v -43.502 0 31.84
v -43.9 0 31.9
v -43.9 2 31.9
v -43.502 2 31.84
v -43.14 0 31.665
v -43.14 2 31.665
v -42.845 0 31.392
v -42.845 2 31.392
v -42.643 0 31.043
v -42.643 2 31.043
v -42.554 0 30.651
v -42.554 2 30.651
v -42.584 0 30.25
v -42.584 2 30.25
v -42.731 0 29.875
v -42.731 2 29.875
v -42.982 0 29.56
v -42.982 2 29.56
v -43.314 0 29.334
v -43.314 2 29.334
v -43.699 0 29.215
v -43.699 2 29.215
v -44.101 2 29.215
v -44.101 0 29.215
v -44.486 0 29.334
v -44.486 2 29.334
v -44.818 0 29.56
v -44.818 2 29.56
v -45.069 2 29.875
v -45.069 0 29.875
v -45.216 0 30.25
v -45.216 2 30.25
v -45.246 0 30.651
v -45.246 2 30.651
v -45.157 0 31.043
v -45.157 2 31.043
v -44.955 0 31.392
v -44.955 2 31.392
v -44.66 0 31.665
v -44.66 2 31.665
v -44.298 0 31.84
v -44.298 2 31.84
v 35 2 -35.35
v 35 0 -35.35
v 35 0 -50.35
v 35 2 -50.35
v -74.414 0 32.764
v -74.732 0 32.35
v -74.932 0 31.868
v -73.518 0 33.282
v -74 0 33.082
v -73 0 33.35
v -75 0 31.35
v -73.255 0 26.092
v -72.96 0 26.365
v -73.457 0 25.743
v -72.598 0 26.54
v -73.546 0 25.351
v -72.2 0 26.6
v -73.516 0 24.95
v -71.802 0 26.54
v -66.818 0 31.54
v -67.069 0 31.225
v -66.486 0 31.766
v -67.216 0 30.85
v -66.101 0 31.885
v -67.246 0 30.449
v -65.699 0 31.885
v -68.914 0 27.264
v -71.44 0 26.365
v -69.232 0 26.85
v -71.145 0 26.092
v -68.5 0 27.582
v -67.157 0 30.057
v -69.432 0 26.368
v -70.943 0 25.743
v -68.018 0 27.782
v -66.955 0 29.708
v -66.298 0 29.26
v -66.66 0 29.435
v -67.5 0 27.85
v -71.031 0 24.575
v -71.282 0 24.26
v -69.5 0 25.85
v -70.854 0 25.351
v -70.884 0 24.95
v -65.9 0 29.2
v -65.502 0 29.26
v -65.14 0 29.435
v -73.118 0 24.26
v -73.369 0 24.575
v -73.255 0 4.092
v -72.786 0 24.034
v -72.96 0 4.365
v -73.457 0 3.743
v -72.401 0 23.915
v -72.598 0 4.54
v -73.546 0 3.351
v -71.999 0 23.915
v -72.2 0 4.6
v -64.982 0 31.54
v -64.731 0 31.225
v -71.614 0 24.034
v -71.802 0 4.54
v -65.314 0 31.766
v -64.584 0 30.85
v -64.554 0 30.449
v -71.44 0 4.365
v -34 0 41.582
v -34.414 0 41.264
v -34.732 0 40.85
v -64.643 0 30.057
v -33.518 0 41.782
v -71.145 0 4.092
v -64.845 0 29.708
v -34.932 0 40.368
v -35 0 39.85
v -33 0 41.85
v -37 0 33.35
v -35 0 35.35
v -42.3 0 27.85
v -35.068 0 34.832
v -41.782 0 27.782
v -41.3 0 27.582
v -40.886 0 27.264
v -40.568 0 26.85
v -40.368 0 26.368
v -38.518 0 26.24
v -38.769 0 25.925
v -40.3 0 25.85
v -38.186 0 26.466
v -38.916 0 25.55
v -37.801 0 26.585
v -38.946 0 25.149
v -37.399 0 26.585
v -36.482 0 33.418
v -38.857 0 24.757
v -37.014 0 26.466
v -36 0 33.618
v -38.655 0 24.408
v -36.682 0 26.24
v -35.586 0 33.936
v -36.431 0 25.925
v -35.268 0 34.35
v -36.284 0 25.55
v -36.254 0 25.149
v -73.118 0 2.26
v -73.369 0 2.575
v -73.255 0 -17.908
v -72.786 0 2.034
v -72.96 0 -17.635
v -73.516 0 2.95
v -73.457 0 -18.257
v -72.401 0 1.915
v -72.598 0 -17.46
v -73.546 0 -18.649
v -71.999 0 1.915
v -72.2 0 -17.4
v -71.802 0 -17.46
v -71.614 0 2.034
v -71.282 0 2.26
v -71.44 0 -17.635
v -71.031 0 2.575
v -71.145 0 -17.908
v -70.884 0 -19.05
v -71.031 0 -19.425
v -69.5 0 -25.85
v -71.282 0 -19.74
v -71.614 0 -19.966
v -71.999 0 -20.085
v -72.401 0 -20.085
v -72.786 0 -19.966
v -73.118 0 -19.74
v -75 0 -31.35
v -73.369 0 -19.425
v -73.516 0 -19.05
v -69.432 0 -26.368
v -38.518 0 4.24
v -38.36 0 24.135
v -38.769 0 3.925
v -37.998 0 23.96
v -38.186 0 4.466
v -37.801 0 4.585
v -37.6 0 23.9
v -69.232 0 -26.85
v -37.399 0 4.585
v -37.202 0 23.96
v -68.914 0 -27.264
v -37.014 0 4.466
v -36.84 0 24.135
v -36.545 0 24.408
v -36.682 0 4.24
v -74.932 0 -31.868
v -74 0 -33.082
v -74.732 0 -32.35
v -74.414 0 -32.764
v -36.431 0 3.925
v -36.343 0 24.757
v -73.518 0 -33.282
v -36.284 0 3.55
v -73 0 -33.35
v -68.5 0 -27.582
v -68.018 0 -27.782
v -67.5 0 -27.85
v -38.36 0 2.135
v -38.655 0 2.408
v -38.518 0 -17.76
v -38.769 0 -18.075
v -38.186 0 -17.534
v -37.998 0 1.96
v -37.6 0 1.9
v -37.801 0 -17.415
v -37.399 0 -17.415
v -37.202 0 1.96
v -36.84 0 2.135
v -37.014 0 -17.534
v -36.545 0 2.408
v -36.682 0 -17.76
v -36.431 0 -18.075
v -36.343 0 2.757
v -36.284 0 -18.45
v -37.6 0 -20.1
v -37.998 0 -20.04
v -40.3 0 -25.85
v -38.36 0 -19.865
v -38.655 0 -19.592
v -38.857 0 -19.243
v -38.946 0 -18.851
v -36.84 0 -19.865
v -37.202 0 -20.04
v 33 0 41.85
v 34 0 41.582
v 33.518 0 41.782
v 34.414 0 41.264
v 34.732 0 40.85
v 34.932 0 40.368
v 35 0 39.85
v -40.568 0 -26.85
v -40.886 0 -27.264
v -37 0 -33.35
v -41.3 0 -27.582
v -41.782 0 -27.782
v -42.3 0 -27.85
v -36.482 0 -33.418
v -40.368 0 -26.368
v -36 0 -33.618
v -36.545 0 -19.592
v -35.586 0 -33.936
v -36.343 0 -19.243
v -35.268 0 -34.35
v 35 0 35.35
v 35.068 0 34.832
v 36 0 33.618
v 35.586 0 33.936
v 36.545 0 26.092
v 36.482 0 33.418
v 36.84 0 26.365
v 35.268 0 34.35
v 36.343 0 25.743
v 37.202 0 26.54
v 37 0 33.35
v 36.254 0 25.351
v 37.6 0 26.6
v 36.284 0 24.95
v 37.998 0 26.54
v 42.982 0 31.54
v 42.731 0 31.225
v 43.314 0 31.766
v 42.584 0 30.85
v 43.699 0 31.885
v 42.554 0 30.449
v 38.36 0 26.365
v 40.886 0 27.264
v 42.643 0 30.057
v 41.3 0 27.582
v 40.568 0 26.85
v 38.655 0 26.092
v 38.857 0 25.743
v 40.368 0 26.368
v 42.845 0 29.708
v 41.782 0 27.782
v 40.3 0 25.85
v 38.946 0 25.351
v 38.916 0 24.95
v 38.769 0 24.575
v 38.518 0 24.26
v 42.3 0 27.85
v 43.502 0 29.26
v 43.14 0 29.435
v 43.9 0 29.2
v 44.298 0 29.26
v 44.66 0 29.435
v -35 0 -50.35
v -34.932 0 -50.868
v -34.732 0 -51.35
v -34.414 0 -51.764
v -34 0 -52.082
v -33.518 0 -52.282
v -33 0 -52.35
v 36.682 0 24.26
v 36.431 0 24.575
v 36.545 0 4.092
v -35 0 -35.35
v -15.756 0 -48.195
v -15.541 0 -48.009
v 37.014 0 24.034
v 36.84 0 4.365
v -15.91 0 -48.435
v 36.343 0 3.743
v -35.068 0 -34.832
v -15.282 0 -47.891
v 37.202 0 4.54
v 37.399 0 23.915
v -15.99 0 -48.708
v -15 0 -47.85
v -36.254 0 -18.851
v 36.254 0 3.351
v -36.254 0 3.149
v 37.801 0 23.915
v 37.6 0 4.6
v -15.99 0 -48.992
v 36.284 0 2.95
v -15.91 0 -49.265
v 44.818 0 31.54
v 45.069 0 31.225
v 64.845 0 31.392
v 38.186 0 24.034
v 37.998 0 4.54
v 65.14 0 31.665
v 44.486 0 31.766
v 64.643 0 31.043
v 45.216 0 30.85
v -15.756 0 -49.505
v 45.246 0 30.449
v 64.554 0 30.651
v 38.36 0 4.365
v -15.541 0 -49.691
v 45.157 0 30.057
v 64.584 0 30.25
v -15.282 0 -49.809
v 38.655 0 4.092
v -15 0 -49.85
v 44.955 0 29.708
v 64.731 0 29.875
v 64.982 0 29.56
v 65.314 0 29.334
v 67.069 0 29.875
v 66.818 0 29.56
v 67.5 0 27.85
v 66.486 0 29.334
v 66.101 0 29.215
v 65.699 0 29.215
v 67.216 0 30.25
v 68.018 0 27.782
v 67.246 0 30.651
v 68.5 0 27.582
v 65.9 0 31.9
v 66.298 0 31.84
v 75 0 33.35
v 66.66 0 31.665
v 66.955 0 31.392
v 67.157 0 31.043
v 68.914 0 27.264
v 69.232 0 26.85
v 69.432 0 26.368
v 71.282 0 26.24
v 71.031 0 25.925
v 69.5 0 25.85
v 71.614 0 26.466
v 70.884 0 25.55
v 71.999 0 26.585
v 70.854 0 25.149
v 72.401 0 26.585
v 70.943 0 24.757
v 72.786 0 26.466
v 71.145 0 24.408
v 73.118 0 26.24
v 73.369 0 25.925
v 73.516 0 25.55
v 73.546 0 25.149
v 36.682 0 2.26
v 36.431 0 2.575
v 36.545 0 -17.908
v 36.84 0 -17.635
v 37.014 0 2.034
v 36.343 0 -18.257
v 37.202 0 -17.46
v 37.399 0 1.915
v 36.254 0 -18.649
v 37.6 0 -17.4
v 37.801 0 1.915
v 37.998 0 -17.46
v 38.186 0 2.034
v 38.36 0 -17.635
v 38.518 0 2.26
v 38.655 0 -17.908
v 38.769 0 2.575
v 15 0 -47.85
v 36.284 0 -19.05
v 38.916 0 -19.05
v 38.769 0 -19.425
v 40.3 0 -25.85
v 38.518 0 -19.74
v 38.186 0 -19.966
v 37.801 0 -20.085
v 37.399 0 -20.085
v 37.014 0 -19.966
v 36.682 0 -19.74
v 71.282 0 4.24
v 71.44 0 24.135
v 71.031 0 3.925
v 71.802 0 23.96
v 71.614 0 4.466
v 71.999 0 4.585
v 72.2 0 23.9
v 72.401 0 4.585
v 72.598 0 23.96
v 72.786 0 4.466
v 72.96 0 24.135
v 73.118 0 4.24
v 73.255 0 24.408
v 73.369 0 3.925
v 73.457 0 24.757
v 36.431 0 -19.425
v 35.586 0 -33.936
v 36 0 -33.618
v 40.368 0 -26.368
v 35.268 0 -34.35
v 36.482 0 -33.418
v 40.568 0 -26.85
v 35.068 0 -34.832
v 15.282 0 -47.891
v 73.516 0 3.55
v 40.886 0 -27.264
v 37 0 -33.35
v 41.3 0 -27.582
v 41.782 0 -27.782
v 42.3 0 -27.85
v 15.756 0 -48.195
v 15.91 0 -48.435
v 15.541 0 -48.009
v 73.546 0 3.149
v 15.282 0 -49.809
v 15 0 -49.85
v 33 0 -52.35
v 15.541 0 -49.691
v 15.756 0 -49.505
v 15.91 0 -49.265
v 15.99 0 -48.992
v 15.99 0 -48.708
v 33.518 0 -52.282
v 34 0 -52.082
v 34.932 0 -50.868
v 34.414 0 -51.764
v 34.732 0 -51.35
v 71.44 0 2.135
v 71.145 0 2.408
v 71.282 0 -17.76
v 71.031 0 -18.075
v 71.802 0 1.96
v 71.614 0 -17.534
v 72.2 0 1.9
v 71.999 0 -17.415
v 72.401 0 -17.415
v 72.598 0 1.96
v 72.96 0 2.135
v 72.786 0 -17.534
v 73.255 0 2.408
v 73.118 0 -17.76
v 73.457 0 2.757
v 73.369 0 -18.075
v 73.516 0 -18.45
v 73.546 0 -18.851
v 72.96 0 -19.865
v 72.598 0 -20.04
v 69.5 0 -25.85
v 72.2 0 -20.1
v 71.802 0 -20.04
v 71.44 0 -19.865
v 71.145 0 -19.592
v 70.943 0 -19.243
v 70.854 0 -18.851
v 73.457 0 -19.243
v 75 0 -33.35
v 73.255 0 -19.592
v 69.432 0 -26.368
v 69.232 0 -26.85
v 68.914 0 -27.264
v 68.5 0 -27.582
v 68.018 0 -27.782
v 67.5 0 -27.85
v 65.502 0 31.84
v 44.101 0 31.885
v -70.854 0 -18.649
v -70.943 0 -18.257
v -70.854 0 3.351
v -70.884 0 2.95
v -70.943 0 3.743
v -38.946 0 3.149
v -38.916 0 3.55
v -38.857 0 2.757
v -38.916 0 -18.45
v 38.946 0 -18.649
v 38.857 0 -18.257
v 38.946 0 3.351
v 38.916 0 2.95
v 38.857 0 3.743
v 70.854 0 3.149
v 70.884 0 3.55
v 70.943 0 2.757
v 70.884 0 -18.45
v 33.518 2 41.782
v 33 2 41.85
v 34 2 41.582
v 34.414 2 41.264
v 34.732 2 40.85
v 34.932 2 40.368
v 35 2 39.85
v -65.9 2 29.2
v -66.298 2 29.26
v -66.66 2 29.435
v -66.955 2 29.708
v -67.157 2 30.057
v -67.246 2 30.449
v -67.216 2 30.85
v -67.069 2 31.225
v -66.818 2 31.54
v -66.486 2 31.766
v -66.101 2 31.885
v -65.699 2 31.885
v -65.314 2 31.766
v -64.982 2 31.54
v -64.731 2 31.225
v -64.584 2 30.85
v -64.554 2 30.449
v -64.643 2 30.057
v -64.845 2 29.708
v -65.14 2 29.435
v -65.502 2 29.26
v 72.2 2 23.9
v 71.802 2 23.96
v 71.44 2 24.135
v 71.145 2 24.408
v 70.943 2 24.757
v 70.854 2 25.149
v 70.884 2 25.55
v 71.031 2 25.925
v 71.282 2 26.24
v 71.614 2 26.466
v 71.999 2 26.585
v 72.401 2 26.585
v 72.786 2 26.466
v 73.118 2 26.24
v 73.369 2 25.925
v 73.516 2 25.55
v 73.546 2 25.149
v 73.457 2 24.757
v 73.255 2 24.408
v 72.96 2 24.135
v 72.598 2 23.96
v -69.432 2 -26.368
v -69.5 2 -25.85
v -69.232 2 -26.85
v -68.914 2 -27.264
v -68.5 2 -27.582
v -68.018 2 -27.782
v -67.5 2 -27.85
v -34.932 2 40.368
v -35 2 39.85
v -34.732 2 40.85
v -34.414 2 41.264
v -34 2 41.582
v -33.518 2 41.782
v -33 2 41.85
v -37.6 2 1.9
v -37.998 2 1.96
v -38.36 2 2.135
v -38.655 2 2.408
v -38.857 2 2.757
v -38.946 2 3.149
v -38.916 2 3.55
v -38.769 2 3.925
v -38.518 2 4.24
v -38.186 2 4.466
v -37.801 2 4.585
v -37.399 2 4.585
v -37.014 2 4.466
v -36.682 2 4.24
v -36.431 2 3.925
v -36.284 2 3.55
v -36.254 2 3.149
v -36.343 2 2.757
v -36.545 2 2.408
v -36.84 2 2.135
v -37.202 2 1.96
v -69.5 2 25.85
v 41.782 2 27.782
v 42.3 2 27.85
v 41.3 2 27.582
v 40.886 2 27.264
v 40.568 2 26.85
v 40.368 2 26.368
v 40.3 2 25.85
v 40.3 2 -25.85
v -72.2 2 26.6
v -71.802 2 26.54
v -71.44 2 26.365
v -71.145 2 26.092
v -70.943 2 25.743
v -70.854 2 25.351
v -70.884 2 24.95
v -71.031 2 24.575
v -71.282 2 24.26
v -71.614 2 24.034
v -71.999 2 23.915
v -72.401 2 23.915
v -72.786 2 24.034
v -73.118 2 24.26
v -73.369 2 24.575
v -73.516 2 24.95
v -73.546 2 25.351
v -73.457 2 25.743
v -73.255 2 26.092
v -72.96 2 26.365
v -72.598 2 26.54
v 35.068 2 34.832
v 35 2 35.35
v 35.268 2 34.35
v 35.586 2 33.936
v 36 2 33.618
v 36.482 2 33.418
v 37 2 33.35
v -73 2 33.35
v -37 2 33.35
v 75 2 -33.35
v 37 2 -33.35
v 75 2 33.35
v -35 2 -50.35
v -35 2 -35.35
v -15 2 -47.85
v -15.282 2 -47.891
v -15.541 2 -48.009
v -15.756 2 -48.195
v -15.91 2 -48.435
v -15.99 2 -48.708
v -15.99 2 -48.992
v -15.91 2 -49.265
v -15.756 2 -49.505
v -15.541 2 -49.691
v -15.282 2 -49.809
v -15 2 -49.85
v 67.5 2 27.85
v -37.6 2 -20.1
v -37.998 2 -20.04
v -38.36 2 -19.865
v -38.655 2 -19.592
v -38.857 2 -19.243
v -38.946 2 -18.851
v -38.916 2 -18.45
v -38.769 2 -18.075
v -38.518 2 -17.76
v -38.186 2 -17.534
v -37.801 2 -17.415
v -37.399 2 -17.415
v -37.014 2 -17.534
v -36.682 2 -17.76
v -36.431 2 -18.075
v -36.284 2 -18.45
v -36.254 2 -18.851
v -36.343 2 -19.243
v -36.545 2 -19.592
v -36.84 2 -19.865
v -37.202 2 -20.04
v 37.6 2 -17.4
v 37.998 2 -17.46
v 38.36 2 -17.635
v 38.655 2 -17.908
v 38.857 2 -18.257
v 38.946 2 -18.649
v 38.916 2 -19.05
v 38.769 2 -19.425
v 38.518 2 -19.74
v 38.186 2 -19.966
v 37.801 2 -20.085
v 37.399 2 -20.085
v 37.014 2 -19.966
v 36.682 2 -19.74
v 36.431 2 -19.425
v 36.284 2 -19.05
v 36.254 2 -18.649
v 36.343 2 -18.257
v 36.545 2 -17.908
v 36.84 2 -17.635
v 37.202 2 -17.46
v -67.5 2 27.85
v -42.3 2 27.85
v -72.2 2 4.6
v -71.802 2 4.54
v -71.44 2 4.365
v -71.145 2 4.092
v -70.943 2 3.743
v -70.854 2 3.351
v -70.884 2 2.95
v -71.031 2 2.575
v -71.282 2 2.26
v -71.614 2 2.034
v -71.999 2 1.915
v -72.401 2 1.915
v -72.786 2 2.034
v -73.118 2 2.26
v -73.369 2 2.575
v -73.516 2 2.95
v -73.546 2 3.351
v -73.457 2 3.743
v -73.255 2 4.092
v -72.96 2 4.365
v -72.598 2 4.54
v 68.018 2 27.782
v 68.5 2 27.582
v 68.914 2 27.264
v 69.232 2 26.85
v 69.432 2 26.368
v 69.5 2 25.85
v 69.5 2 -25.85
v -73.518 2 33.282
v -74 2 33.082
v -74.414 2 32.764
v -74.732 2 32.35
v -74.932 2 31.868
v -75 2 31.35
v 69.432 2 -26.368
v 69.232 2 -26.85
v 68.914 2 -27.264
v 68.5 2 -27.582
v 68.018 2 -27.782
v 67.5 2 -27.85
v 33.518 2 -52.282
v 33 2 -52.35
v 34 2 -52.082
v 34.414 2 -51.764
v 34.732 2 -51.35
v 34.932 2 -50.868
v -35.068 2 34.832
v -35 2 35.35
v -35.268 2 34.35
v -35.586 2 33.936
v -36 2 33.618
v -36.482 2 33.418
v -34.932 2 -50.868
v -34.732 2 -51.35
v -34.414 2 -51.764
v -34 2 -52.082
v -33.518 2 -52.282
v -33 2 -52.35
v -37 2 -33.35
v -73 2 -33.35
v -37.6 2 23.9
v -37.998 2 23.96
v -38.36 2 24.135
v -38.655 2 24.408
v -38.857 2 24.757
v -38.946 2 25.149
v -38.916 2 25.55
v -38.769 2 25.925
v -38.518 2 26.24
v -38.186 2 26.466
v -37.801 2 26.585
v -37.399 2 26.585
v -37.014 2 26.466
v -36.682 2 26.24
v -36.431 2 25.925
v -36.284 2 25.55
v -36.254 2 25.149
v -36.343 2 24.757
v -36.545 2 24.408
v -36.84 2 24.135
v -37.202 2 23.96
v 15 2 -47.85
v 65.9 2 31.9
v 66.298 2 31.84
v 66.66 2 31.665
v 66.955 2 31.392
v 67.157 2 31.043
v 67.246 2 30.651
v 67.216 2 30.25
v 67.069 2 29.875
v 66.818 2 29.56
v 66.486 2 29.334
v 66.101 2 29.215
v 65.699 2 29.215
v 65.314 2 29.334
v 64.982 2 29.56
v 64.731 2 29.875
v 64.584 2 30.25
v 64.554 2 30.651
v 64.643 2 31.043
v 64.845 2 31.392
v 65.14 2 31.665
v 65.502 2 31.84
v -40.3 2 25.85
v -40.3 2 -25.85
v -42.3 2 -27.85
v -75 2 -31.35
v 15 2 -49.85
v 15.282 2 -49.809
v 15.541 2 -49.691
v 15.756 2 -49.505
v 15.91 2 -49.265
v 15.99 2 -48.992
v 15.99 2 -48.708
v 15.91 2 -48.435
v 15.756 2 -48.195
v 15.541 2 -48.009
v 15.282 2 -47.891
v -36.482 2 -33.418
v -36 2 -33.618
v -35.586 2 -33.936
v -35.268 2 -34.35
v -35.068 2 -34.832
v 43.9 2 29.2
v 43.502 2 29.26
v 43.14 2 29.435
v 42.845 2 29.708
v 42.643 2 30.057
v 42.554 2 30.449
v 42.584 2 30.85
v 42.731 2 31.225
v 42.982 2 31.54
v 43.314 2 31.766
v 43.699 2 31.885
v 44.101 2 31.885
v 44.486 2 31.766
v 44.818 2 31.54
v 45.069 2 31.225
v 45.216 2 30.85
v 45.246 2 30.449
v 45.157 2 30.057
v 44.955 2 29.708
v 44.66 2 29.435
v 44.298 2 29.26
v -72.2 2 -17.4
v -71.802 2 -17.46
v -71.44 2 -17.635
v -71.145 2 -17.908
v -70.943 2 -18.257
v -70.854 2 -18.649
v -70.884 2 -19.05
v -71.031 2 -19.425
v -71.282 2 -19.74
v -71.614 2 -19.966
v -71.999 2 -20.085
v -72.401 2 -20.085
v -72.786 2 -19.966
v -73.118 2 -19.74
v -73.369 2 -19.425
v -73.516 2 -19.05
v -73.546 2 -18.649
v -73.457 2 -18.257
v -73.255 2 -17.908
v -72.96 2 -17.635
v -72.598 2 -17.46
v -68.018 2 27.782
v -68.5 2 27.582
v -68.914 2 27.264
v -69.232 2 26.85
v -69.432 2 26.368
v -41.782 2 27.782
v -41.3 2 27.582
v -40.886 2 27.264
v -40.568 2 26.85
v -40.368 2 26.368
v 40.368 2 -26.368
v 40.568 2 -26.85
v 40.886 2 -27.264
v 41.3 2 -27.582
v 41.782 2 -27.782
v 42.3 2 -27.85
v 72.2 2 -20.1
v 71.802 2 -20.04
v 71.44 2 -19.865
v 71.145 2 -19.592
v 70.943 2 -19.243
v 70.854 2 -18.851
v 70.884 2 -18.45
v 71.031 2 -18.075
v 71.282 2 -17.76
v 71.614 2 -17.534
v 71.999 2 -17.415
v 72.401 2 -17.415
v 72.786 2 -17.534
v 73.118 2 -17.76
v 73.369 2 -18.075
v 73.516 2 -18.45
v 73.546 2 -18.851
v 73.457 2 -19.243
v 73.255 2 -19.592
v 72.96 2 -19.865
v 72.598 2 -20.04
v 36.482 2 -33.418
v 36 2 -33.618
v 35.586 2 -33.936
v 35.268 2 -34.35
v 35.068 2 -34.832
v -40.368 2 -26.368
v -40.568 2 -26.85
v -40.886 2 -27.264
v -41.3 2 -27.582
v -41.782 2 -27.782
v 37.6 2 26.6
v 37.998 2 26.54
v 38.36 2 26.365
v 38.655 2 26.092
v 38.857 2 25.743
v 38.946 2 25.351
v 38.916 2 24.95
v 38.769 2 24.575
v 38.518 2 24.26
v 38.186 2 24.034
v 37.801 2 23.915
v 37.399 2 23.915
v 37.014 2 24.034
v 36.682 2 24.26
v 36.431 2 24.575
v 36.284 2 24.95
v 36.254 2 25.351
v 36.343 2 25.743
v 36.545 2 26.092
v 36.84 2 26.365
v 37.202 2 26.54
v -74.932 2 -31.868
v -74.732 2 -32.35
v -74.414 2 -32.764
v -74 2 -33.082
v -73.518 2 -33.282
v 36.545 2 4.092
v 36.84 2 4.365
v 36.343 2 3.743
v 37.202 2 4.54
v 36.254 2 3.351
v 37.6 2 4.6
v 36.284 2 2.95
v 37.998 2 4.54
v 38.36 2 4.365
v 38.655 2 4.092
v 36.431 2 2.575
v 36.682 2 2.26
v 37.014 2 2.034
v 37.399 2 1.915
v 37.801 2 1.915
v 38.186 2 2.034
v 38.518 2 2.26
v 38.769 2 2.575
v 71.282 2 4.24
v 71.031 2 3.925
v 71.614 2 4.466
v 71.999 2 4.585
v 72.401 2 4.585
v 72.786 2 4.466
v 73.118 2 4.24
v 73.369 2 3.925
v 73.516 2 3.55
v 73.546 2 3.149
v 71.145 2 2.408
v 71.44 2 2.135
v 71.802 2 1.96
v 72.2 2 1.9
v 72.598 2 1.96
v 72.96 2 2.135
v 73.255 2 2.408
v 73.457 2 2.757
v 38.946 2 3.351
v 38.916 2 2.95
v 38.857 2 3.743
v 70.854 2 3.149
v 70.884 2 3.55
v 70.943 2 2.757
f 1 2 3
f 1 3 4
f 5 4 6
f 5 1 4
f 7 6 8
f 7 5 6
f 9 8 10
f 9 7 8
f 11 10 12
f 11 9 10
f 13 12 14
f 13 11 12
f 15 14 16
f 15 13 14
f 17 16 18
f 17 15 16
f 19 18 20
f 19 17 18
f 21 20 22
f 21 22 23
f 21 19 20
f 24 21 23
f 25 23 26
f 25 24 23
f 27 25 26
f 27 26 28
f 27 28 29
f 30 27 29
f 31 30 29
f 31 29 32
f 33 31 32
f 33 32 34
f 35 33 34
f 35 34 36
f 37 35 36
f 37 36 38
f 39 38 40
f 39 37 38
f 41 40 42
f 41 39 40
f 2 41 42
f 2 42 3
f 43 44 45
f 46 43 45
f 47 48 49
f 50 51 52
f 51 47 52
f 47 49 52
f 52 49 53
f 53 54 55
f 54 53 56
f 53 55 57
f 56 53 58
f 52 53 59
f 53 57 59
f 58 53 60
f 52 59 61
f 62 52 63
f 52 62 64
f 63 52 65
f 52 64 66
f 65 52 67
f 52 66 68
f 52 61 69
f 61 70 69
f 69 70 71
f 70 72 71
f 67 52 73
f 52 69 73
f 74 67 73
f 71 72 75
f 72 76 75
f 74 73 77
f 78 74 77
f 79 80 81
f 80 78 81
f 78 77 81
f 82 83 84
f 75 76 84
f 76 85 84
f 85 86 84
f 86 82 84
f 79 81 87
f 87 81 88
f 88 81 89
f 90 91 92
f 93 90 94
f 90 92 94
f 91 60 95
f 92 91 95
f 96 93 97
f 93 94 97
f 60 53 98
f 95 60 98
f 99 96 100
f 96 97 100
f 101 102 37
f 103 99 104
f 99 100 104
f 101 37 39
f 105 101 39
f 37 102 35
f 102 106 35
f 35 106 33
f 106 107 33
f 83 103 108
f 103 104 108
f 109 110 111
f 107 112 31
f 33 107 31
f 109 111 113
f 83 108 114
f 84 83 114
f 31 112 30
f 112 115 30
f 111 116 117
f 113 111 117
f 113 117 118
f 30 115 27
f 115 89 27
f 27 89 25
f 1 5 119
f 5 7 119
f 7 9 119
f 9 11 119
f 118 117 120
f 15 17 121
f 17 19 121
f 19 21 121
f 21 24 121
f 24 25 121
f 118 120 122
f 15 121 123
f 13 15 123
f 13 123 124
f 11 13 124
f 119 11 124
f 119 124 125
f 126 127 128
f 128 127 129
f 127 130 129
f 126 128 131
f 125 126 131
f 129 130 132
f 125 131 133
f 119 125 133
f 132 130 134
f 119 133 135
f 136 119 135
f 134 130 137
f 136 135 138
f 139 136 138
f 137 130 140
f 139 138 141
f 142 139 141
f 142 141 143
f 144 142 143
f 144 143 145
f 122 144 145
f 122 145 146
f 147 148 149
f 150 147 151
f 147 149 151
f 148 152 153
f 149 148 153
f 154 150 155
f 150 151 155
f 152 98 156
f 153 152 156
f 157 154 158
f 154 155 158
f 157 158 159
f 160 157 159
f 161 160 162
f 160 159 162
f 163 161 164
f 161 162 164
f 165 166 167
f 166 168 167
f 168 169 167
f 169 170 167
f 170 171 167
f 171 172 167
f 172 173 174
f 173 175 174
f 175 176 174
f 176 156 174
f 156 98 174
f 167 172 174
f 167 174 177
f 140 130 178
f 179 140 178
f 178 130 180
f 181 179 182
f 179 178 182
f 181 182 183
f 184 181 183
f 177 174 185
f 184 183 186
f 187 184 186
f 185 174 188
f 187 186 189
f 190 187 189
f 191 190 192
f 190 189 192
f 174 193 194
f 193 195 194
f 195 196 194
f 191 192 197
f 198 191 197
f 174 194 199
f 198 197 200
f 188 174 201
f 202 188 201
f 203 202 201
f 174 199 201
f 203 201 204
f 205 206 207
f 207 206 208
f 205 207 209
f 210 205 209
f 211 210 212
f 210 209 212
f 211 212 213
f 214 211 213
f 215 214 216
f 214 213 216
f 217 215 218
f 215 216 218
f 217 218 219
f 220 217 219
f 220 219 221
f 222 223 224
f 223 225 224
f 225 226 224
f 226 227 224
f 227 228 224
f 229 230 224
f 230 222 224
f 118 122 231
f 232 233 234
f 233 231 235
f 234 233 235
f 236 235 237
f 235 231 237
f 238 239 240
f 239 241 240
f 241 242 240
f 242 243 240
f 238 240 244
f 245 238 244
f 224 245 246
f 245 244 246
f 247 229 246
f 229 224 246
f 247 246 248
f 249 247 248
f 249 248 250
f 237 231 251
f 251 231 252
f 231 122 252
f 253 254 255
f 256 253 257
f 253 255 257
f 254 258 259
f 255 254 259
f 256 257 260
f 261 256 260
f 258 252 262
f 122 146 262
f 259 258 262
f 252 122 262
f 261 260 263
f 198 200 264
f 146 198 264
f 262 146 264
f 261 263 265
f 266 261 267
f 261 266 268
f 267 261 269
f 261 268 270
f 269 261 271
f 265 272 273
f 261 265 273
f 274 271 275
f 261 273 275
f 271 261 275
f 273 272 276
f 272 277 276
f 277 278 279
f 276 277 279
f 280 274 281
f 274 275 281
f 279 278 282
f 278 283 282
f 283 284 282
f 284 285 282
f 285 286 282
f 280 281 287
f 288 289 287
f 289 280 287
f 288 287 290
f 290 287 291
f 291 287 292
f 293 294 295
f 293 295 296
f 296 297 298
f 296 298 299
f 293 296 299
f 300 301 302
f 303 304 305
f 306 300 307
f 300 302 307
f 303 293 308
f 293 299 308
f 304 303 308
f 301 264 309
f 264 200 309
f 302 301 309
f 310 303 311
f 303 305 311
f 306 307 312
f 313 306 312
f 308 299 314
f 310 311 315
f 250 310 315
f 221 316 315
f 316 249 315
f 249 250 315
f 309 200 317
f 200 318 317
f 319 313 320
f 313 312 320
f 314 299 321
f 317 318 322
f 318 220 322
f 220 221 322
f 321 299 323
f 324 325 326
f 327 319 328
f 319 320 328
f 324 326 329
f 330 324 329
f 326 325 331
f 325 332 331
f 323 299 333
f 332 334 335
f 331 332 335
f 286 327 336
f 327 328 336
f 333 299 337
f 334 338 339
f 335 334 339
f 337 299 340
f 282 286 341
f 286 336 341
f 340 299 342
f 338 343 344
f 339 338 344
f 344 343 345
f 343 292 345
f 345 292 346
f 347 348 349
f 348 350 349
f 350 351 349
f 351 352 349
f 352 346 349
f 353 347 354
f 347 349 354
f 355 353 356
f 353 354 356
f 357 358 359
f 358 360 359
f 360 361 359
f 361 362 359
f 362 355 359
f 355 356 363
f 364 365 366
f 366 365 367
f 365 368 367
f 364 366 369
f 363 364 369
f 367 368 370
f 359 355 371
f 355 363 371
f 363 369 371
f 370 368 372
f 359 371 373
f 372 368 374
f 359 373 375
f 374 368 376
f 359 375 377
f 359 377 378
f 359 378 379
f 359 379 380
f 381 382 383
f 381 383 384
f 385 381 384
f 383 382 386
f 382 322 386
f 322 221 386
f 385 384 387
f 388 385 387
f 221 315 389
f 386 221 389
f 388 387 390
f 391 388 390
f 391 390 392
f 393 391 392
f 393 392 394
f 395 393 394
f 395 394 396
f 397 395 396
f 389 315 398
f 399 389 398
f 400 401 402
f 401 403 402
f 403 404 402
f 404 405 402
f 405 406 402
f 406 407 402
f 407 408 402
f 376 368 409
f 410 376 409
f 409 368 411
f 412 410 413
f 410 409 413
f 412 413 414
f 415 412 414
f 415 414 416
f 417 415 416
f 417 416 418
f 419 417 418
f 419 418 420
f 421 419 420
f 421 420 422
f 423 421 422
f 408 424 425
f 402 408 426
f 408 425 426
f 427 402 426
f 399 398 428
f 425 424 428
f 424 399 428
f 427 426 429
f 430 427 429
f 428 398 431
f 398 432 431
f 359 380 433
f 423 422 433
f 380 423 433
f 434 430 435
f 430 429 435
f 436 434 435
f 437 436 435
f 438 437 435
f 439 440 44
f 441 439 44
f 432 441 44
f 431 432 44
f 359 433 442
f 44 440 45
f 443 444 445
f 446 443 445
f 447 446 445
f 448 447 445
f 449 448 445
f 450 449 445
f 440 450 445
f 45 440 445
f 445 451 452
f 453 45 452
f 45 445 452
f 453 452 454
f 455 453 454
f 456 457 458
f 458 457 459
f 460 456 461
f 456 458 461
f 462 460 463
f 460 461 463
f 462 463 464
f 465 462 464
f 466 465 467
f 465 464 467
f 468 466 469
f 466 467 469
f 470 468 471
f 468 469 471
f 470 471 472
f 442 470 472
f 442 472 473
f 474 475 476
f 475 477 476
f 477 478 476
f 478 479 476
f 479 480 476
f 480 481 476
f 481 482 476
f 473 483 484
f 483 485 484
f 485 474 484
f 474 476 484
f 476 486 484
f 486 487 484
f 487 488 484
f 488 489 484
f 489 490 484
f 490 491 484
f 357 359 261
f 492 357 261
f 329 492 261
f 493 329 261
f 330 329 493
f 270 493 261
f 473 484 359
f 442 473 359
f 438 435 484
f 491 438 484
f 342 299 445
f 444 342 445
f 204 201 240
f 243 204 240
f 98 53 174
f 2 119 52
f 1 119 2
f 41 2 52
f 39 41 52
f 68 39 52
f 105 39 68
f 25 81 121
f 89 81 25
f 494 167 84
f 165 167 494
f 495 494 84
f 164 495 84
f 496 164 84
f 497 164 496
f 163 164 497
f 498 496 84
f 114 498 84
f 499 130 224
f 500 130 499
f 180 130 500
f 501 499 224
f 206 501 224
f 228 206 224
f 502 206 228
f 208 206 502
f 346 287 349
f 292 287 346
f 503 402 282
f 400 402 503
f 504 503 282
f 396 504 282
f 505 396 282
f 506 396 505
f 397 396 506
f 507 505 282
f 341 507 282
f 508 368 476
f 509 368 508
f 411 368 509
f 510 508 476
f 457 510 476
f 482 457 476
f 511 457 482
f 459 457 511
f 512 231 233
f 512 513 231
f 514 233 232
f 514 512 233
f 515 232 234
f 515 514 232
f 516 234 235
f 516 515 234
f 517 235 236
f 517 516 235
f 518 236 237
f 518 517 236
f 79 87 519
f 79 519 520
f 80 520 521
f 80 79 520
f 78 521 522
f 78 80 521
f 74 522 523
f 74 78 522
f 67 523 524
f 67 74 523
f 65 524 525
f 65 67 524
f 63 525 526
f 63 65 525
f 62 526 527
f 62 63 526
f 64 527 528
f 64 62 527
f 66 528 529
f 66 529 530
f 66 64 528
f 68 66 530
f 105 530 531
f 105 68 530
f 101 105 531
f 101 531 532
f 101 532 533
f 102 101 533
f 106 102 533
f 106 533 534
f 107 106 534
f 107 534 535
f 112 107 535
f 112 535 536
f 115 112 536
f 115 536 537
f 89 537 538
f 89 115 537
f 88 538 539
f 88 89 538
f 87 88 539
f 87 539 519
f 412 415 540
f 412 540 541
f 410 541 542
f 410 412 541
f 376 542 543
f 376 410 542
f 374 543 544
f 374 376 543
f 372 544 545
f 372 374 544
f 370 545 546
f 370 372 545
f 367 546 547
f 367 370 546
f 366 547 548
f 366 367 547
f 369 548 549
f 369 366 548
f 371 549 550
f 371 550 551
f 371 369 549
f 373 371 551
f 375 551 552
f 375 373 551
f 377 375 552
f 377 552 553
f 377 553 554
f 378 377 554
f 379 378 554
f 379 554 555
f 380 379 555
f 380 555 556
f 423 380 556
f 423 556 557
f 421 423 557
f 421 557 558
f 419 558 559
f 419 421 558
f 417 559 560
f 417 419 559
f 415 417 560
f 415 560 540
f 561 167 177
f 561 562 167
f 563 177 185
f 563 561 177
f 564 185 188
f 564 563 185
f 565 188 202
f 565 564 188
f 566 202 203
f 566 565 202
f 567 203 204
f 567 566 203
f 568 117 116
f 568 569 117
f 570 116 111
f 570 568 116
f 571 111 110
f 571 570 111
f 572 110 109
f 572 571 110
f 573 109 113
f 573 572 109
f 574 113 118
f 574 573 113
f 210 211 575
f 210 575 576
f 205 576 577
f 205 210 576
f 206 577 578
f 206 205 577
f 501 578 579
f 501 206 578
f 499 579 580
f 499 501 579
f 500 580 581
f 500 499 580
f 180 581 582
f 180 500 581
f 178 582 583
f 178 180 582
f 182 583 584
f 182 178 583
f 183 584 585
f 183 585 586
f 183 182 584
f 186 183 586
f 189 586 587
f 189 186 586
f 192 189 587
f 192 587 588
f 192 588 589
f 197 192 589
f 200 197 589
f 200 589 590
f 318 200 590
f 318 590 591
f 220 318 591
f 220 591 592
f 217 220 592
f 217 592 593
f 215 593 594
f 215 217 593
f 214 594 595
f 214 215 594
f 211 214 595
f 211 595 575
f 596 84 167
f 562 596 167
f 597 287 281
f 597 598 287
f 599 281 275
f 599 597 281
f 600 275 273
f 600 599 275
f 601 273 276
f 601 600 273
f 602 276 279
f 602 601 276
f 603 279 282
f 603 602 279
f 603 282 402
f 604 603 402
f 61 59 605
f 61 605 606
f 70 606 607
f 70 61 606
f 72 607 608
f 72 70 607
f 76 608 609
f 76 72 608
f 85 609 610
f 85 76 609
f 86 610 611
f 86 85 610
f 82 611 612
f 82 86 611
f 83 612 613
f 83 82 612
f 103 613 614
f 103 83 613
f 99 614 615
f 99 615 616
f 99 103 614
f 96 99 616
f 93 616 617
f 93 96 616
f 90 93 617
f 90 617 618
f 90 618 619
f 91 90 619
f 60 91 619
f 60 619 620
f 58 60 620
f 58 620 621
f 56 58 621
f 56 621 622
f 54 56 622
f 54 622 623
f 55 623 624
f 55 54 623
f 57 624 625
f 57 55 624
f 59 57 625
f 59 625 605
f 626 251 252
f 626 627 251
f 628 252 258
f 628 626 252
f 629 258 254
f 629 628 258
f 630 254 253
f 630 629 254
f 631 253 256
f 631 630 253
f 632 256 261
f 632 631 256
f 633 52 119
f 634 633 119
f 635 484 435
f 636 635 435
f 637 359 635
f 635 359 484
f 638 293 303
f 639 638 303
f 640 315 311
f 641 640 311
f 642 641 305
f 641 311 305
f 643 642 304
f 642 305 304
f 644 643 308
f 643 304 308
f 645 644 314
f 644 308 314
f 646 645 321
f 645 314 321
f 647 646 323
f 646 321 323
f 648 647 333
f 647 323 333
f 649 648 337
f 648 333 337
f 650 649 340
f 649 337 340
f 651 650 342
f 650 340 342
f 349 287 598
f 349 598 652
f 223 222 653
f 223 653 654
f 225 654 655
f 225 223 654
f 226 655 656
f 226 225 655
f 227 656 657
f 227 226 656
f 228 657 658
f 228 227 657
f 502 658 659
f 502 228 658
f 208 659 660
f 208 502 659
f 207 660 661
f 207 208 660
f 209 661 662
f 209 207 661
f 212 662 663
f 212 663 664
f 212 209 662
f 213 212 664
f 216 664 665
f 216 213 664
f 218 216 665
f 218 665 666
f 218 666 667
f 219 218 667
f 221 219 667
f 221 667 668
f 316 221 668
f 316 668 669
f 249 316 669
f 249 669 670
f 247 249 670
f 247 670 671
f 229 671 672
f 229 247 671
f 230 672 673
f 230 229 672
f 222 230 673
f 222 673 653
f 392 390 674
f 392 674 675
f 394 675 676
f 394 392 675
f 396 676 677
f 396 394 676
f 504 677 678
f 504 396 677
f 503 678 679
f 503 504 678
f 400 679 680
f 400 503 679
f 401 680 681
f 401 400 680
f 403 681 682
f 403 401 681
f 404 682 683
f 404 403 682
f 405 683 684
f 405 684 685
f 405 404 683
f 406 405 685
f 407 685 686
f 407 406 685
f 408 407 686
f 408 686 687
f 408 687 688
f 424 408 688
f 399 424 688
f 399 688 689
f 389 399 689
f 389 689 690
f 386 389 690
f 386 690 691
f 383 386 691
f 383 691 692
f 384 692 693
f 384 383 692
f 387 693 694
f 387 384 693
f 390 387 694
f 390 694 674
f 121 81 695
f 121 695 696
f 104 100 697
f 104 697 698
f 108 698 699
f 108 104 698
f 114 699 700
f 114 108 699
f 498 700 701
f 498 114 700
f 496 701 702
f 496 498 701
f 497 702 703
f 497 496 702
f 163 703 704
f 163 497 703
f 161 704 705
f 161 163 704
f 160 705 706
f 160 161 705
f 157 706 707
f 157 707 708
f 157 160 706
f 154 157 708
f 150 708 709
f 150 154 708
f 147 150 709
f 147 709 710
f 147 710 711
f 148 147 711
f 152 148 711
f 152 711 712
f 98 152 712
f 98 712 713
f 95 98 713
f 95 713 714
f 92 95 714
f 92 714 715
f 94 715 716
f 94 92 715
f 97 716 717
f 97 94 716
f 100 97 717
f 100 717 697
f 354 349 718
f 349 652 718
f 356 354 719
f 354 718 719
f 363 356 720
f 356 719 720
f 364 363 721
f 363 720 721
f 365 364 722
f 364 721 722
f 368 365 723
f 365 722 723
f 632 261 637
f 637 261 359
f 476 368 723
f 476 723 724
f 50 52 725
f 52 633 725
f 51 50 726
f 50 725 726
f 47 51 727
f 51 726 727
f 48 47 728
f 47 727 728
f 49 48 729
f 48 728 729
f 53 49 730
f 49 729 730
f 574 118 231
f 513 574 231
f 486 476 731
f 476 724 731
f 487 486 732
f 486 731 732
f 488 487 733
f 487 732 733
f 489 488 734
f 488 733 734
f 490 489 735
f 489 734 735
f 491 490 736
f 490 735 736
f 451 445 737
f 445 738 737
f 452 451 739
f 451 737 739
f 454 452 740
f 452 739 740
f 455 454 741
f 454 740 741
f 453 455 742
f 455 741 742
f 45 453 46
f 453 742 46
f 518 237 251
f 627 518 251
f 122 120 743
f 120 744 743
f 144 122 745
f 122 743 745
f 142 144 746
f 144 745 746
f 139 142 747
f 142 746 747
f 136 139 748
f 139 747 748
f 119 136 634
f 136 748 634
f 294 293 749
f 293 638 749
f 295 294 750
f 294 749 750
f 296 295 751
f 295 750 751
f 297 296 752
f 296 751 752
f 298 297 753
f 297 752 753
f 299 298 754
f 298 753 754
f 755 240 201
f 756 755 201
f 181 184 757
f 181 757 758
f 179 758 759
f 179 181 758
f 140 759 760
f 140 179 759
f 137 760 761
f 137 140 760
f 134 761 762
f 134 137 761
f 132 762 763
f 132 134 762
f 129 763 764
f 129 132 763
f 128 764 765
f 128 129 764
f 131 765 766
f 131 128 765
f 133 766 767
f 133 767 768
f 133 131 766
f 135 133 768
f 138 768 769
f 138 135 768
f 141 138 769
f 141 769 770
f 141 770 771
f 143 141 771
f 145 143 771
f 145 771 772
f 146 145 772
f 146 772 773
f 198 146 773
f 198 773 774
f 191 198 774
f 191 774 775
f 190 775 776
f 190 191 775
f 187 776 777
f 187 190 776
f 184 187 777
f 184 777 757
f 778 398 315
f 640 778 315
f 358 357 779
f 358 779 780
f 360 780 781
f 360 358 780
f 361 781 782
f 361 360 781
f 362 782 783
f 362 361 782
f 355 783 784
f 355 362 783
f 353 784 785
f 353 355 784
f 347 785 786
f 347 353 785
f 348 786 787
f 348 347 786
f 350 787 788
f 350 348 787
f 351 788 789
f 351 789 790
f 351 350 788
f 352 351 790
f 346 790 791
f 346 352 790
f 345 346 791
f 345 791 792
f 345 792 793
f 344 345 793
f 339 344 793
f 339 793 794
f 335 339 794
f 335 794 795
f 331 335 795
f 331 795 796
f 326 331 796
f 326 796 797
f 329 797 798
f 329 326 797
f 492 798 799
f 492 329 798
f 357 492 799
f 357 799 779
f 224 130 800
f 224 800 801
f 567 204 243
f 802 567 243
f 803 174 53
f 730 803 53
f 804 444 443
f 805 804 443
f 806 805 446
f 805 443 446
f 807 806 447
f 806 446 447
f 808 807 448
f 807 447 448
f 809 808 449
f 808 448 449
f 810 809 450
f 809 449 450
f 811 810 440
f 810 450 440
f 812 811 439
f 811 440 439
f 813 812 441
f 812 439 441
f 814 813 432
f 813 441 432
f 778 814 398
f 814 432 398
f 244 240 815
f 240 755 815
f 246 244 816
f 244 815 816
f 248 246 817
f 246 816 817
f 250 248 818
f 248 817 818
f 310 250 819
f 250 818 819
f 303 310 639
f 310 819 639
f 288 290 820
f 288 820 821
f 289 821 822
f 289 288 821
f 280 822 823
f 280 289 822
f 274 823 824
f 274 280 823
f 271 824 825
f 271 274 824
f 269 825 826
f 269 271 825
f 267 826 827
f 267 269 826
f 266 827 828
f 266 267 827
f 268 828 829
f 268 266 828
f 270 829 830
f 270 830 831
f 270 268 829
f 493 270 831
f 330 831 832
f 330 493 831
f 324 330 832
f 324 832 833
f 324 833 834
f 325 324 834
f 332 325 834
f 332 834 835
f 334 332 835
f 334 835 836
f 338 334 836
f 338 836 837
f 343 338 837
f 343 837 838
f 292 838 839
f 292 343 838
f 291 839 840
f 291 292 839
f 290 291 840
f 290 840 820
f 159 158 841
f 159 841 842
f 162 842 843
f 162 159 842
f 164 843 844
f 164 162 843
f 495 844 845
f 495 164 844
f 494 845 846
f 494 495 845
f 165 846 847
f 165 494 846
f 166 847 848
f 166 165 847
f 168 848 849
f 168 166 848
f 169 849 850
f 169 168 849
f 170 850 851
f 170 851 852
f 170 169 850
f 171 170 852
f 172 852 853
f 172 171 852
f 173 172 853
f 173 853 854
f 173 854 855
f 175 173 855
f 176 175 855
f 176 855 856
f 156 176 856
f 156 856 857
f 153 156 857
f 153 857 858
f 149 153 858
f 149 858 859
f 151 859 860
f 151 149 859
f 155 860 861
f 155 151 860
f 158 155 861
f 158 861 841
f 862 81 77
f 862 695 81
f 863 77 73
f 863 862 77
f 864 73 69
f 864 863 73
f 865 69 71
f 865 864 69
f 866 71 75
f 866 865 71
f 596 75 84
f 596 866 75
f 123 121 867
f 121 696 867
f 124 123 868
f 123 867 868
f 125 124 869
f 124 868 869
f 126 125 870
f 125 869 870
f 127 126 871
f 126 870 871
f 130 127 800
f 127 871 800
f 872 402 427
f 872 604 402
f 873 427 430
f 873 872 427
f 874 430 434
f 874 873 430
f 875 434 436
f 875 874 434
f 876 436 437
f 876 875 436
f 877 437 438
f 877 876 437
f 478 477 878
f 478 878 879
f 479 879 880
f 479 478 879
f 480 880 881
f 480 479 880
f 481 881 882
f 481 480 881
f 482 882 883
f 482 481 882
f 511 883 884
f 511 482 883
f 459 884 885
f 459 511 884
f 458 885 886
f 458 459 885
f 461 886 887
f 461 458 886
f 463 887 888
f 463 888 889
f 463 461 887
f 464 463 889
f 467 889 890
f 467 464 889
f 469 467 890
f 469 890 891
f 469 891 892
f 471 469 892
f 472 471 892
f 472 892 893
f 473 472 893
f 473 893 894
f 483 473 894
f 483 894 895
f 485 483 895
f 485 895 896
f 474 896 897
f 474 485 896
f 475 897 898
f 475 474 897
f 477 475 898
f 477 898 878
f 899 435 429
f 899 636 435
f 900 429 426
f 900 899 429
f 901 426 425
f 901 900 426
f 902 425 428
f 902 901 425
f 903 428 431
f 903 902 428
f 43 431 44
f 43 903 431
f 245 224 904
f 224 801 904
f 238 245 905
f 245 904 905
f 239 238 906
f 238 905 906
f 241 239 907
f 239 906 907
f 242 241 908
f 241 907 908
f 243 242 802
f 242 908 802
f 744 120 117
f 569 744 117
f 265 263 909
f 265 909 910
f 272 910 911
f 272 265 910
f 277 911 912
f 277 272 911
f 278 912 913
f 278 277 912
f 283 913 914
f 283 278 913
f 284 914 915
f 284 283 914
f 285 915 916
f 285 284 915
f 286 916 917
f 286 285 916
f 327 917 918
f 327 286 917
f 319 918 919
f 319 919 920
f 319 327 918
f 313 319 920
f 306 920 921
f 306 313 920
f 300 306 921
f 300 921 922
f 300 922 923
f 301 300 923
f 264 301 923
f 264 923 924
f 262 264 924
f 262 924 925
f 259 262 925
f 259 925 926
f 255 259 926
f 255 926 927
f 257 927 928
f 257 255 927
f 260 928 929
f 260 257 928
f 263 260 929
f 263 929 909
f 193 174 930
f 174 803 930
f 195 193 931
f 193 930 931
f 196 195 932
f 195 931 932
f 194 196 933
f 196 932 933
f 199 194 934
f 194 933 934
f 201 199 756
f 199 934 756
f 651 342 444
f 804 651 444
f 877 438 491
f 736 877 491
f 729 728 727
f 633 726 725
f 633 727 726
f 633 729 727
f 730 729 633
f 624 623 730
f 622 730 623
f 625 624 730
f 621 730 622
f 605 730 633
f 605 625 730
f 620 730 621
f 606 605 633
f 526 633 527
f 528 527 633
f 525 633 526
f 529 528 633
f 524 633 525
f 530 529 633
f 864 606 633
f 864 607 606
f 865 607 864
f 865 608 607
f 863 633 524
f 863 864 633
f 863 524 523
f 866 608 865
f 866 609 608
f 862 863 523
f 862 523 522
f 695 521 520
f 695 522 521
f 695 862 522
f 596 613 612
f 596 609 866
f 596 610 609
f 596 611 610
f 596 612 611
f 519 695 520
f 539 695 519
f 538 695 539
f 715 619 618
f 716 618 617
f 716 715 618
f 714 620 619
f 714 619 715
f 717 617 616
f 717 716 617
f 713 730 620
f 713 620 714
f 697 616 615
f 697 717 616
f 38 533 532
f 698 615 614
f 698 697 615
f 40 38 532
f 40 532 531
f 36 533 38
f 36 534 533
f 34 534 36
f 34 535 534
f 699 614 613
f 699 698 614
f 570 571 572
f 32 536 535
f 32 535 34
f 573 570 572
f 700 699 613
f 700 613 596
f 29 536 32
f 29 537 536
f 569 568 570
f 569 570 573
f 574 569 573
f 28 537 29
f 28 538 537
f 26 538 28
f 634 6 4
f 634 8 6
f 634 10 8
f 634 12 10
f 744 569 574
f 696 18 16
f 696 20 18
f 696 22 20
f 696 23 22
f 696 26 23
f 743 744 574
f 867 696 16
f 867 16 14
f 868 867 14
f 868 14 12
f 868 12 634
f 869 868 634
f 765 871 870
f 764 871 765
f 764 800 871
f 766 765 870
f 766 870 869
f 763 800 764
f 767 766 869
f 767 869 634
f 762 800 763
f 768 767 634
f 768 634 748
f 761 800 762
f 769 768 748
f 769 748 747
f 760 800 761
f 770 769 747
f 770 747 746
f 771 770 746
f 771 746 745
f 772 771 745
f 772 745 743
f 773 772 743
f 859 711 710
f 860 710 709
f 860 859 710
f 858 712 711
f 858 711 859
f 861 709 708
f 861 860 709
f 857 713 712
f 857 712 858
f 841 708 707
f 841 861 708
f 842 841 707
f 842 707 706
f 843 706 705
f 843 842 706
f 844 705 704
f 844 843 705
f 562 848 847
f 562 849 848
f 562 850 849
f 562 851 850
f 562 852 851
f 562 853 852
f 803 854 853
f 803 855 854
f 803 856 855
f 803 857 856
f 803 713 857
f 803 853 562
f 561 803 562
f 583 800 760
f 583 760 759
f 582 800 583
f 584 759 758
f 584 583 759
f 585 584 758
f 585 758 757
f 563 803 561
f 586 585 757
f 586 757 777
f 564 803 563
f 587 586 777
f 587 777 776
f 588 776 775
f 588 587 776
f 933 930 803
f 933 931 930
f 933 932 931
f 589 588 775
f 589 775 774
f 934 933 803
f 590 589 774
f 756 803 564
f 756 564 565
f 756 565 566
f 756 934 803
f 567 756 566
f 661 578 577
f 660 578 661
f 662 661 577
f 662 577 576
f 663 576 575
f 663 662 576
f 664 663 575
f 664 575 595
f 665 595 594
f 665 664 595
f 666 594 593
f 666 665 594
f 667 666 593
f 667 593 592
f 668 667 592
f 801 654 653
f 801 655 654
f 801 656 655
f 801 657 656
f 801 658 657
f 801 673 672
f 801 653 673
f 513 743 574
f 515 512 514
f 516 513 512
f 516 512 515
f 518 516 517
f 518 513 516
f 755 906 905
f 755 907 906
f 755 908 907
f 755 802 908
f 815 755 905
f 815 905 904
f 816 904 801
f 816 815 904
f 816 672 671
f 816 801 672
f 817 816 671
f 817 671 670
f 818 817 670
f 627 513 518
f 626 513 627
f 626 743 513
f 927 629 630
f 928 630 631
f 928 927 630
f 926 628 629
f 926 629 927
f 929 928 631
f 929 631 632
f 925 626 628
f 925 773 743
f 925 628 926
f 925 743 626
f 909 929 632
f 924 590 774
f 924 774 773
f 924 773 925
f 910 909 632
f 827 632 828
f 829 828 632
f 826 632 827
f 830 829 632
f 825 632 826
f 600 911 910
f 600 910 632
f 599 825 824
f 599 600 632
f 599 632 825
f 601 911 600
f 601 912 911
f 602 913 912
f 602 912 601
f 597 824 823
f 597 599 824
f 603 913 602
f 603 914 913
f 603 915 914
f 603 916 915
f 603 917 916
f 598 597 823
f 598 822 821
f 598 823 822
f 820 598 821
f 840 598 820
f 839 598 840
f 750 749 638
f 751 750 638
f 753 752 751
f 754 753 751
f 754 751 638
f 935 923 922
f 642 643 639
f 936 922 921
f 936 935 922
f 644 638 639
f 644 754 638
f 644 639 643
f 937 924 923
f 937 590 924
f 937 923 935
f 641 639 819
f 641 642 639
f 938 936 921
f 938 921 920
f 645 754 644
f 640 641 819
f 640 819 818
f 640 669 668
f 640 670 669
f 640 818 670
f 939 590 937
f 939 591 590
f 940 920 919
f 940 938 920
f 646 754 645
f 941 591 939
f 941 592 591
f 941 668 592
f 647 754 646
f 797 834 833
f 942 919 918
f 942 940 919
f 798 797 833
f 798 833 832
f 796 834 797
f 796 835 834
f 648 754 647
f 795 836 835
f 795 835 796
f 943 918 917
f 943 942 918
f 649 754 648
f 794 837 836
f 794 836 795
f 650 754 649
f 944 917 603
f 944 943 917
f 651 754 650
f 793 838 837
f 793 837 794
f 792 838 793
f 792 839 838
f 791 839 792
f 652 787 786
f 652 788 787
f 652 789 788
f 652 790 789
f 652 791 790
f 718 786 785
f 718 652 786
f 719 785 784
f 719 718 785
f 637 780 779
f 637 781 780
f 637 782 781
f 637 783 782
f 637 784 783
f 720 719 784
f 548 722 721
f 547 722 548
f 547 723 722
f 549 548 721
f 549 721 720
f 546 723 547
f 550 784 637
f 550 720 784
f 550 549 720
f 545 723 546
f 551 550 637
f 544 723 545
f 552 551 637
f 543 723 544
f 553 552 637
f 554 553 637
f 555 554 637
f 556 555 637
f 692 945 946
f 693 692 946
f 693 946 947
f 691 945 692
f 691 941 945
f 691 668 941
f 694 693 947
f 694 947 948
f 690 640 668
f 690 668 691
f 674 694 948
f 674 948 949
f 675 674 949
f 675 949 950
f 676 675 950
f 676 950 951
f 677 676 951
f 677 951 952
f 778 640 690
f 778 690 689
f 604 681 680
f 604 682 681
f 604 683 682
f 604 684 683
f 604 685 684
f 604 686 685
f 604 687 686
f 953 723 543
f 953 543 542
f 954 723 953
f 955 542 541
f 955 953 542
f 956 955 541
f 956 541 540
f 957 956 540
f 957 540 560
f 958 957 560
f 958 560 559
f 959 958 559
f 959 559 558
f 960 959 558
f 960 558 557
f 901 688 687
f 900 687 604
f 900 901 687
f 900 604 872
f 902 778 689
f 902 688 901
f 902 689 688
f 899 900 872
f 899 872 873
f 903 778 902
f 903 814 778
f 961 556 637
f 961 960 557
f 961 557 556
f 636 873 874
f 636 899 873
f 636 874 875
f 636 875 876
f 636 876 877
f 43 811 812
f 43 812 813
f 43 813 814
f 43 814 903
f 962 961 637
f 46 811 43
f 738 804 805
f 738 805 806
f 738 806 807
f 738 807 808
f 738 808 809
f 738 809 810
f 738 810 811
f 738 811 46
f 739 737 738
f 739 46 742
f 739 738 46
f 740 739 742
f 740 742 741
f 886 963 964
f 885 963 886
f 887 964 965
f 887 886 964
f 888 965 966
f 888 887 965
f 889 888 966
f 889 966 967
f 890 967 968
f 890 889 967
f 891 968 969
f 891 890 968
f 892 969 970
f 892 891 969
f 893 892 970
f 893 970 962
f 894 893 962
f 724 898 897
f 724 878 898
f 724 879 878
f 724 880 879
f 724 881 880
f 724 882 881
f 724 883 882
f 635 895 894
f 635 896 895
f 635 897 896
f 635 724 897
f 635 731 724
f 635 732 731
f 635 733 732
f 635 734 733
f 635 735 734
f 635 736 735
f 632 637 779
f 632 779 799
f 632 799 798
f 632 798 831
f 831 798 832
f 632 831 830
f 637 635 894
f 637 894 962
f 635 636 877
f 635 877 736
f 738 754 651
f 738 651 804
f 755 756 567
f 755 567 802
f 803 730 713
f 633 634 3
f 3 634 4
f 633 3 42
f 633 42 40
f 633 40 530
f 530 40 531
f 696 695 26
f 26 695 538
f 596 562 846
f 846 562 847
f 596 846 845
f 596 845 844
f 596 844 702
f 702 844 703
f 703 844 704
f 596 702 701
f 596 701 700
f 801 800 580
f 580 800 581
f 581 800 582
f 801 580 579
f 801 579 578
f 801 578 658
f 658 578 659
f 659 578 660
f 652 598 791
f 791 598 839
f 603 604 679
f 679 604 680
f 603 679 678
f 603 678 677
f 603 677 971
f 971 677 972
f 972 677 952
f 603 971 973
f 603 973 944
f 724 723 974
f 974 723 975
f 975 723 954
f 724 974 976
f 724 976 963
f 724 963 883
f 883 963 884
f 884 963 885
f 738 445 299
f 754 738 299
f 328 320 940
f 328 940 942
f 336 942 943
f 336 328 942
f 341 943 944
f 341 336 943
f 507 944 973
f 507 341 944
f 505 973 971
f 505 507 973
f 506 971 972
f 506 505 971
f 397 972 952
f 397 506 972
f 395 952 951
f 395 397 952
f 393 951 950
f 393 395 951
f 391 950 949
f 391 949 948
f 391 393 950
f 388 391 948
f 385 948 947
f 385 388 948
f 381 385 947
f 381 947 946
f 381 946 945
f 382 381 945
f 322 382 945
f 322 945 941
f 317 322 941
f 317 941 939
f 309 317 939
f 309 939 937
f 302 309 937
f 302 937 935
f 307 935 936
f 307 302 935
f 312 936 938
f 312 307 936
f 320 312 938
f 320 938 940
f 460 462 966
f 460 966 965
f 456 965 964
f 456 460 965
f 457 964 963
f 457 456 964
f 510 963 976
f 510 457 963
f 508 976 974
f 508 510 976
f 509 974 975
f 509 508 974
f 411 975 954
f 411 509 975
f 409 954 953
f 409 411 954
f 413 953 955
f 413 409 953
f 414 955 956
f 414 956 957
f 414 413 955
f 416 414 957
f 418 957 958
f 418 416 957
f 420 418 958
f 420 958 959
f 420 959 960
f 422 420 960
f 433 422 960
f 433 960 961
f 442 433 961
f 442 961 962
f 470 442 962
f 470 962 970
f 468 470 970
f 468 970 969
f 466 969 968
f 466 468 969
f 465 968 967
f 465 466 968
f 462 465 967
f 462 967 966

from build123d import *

# Parameters (mm, degrees)
SKETCH_1_R      = 1.35
SKETCH_1_W      = 29.2
SKETCH_1_H      = 55.7
EXTRUDE_1_DEPTH = 2
FILLET_1_R      = 2


with BuildPart() as part:
    # 草图1 → 凸台-拉伸1 (new body)
    with BuildSketch(Plane(origin=(0, 0, 0), x_dir=(1, 0, 0), z_dir=(0, 1, 0))):
        Polygon((-35, -33.35), (-35, -41.85), (35, -41.85), (35, -33.35), (75, -33.35), (75, 33.35), (35, 33.35), (35, 52.35), (-35, 52.35), (-35, 33.35), (-75, 33.35), (-75, -33.35), align=None)
        with Locations(Location((-72.2, 18.75, 0), (0, 0, 270))):
            Circle(SKETCH_1_R, mode=Mode.SUBTRACT)
        with Locations(Location((-72.2, -3.25, 0), (0, 0, 270))):
            Circle(SKETCH_1_R, mode=Mode.SUBTRACT)
        with Locations(Location((-72.2, -25.25, 0), (0, 0, 270))):
            Circle(SKETCH_1_R, mode=Mode.SUBTRACT)
        with Locations(Location((-37.6, -25.25, 0), (0, 0, 90))):
            Circle(SKETCH_1_R, mode=Mode.SUBTRACT)
        with Locations(Location((-37.6, -3.25, 0), (0, 0, 90))):
            Circle(SKETCH_1_R, mode=Mode.SUBTRACT)
        with Locations(Location((-37.6, 18.75, 0), (0, 0, 90))):
            Circle(SKETCH_1_R, mode=Mode.SUBTRACT)
        with Locations(Location((37.6, 18.75, 0), (0, 0, 270))):
            Circle(SKETCH_1_R, mode=Mode.SUBTRACT)
        with Locations(Location((37.6, -3.25, 0), (0, 0, 270))):
            Circle(SKETCH_1_R, mode=Mode.SUBTRACT)
        with Locations(Location((37.6, -25.25, 0), (0, 0, 270))):
            Circle(SKETCH_1_R, mode=Mode.SUBTRACT)
        with Locations(Location((72.2, -25.25, 0), (0, 0, 90))):
            Circle(SKETCH_1_R, mode=Mode.SUBTRACT)
        with Locations(Location((72.2, -3.25, 0), (0, 0, 90))):
            Circle(SKETCH_1_R, mode=Mode.SUBTRACT)
        with Locations(Location((72.2, 18.75, 0), (0, 0, 90))):
            Circle(SKETCH_1_R, mode=Mode.SUBTRACT)
        with Locations(Location((-43.9, -30.55, 0), (0, 0, 270))):
            Circle(SKETCH_1_R, mode=Mode.SUBTRACT)
        with Locations(Location((-65.9, -30.55, 0), (0, 0, 90))):
            Circle(SKETCH_1_R, mode=Mode.SUBTRACT)
        with Locations(Location((43.9, -30.55, 0), (0, 0, 90))):
            Circle(SKETCH_1_R, mode=Mode.SUBTRACT)
        with Locations(Location((65.9, -30.55, 0), (0, 0, 270))):
            Circle(SKETCH_1_R, mode=Mode.SUBTRACT)
        with Locations((-54.9, 0)):
            Rectangle(SKETCH_1_W, SKETCH_1_H, mode=Mode.SUBTRACT)
        with Locations((54.9, 0)):
            Rectangle(SKETCH_1_W, SKETCH_1_H, mode=Mode.SUBTRACT)
        with BuildLine():
            Line((-15, 49.85), (15, 49.85))
            ThreePointArc((15, 49.85), (16, 48.85), (15, 47.85))
            Line((15, 47.85), (-15, 47.85))
            ThreePointArc((-15, 47.85), (-16, 48.85), (-15, 49.85))
        make_face(mode=Mode.SUBTRACT)
    extrude(amount=EXTRUDE_1_DEPTH)

    # 圆角1
    fillet_1_edges = [part.edges().sort_by_distance(p)[0] for p in [
        (-35, 1, -52.35),
        (35, 1, -52.35),
        (35, 1, -33.35),
        (35, 1, 33.35),
        (35, 1, 41.85),
        (-35, 1, 41.85),
        (-35, 1, 33.35),
        (-75, 1, 33.35),
        (-75, 1, -33.35),
        (-35, 1, -33.35),
        (-40.3, 1, 27.85),
        (-40.3, 1, -27.85),
        (-69.5, 1, -27.85),
        (-69.5, 1, 27.85),
        (69.5, 1, 27.85),
        (69.5, 1, -27.85),
        (40.3, 1, -27.85),
        (40.3, 1, 27.85),
    ]]
    fillet(fillet_1_edges, radius=FILLET_1_R)


solid = part.part
